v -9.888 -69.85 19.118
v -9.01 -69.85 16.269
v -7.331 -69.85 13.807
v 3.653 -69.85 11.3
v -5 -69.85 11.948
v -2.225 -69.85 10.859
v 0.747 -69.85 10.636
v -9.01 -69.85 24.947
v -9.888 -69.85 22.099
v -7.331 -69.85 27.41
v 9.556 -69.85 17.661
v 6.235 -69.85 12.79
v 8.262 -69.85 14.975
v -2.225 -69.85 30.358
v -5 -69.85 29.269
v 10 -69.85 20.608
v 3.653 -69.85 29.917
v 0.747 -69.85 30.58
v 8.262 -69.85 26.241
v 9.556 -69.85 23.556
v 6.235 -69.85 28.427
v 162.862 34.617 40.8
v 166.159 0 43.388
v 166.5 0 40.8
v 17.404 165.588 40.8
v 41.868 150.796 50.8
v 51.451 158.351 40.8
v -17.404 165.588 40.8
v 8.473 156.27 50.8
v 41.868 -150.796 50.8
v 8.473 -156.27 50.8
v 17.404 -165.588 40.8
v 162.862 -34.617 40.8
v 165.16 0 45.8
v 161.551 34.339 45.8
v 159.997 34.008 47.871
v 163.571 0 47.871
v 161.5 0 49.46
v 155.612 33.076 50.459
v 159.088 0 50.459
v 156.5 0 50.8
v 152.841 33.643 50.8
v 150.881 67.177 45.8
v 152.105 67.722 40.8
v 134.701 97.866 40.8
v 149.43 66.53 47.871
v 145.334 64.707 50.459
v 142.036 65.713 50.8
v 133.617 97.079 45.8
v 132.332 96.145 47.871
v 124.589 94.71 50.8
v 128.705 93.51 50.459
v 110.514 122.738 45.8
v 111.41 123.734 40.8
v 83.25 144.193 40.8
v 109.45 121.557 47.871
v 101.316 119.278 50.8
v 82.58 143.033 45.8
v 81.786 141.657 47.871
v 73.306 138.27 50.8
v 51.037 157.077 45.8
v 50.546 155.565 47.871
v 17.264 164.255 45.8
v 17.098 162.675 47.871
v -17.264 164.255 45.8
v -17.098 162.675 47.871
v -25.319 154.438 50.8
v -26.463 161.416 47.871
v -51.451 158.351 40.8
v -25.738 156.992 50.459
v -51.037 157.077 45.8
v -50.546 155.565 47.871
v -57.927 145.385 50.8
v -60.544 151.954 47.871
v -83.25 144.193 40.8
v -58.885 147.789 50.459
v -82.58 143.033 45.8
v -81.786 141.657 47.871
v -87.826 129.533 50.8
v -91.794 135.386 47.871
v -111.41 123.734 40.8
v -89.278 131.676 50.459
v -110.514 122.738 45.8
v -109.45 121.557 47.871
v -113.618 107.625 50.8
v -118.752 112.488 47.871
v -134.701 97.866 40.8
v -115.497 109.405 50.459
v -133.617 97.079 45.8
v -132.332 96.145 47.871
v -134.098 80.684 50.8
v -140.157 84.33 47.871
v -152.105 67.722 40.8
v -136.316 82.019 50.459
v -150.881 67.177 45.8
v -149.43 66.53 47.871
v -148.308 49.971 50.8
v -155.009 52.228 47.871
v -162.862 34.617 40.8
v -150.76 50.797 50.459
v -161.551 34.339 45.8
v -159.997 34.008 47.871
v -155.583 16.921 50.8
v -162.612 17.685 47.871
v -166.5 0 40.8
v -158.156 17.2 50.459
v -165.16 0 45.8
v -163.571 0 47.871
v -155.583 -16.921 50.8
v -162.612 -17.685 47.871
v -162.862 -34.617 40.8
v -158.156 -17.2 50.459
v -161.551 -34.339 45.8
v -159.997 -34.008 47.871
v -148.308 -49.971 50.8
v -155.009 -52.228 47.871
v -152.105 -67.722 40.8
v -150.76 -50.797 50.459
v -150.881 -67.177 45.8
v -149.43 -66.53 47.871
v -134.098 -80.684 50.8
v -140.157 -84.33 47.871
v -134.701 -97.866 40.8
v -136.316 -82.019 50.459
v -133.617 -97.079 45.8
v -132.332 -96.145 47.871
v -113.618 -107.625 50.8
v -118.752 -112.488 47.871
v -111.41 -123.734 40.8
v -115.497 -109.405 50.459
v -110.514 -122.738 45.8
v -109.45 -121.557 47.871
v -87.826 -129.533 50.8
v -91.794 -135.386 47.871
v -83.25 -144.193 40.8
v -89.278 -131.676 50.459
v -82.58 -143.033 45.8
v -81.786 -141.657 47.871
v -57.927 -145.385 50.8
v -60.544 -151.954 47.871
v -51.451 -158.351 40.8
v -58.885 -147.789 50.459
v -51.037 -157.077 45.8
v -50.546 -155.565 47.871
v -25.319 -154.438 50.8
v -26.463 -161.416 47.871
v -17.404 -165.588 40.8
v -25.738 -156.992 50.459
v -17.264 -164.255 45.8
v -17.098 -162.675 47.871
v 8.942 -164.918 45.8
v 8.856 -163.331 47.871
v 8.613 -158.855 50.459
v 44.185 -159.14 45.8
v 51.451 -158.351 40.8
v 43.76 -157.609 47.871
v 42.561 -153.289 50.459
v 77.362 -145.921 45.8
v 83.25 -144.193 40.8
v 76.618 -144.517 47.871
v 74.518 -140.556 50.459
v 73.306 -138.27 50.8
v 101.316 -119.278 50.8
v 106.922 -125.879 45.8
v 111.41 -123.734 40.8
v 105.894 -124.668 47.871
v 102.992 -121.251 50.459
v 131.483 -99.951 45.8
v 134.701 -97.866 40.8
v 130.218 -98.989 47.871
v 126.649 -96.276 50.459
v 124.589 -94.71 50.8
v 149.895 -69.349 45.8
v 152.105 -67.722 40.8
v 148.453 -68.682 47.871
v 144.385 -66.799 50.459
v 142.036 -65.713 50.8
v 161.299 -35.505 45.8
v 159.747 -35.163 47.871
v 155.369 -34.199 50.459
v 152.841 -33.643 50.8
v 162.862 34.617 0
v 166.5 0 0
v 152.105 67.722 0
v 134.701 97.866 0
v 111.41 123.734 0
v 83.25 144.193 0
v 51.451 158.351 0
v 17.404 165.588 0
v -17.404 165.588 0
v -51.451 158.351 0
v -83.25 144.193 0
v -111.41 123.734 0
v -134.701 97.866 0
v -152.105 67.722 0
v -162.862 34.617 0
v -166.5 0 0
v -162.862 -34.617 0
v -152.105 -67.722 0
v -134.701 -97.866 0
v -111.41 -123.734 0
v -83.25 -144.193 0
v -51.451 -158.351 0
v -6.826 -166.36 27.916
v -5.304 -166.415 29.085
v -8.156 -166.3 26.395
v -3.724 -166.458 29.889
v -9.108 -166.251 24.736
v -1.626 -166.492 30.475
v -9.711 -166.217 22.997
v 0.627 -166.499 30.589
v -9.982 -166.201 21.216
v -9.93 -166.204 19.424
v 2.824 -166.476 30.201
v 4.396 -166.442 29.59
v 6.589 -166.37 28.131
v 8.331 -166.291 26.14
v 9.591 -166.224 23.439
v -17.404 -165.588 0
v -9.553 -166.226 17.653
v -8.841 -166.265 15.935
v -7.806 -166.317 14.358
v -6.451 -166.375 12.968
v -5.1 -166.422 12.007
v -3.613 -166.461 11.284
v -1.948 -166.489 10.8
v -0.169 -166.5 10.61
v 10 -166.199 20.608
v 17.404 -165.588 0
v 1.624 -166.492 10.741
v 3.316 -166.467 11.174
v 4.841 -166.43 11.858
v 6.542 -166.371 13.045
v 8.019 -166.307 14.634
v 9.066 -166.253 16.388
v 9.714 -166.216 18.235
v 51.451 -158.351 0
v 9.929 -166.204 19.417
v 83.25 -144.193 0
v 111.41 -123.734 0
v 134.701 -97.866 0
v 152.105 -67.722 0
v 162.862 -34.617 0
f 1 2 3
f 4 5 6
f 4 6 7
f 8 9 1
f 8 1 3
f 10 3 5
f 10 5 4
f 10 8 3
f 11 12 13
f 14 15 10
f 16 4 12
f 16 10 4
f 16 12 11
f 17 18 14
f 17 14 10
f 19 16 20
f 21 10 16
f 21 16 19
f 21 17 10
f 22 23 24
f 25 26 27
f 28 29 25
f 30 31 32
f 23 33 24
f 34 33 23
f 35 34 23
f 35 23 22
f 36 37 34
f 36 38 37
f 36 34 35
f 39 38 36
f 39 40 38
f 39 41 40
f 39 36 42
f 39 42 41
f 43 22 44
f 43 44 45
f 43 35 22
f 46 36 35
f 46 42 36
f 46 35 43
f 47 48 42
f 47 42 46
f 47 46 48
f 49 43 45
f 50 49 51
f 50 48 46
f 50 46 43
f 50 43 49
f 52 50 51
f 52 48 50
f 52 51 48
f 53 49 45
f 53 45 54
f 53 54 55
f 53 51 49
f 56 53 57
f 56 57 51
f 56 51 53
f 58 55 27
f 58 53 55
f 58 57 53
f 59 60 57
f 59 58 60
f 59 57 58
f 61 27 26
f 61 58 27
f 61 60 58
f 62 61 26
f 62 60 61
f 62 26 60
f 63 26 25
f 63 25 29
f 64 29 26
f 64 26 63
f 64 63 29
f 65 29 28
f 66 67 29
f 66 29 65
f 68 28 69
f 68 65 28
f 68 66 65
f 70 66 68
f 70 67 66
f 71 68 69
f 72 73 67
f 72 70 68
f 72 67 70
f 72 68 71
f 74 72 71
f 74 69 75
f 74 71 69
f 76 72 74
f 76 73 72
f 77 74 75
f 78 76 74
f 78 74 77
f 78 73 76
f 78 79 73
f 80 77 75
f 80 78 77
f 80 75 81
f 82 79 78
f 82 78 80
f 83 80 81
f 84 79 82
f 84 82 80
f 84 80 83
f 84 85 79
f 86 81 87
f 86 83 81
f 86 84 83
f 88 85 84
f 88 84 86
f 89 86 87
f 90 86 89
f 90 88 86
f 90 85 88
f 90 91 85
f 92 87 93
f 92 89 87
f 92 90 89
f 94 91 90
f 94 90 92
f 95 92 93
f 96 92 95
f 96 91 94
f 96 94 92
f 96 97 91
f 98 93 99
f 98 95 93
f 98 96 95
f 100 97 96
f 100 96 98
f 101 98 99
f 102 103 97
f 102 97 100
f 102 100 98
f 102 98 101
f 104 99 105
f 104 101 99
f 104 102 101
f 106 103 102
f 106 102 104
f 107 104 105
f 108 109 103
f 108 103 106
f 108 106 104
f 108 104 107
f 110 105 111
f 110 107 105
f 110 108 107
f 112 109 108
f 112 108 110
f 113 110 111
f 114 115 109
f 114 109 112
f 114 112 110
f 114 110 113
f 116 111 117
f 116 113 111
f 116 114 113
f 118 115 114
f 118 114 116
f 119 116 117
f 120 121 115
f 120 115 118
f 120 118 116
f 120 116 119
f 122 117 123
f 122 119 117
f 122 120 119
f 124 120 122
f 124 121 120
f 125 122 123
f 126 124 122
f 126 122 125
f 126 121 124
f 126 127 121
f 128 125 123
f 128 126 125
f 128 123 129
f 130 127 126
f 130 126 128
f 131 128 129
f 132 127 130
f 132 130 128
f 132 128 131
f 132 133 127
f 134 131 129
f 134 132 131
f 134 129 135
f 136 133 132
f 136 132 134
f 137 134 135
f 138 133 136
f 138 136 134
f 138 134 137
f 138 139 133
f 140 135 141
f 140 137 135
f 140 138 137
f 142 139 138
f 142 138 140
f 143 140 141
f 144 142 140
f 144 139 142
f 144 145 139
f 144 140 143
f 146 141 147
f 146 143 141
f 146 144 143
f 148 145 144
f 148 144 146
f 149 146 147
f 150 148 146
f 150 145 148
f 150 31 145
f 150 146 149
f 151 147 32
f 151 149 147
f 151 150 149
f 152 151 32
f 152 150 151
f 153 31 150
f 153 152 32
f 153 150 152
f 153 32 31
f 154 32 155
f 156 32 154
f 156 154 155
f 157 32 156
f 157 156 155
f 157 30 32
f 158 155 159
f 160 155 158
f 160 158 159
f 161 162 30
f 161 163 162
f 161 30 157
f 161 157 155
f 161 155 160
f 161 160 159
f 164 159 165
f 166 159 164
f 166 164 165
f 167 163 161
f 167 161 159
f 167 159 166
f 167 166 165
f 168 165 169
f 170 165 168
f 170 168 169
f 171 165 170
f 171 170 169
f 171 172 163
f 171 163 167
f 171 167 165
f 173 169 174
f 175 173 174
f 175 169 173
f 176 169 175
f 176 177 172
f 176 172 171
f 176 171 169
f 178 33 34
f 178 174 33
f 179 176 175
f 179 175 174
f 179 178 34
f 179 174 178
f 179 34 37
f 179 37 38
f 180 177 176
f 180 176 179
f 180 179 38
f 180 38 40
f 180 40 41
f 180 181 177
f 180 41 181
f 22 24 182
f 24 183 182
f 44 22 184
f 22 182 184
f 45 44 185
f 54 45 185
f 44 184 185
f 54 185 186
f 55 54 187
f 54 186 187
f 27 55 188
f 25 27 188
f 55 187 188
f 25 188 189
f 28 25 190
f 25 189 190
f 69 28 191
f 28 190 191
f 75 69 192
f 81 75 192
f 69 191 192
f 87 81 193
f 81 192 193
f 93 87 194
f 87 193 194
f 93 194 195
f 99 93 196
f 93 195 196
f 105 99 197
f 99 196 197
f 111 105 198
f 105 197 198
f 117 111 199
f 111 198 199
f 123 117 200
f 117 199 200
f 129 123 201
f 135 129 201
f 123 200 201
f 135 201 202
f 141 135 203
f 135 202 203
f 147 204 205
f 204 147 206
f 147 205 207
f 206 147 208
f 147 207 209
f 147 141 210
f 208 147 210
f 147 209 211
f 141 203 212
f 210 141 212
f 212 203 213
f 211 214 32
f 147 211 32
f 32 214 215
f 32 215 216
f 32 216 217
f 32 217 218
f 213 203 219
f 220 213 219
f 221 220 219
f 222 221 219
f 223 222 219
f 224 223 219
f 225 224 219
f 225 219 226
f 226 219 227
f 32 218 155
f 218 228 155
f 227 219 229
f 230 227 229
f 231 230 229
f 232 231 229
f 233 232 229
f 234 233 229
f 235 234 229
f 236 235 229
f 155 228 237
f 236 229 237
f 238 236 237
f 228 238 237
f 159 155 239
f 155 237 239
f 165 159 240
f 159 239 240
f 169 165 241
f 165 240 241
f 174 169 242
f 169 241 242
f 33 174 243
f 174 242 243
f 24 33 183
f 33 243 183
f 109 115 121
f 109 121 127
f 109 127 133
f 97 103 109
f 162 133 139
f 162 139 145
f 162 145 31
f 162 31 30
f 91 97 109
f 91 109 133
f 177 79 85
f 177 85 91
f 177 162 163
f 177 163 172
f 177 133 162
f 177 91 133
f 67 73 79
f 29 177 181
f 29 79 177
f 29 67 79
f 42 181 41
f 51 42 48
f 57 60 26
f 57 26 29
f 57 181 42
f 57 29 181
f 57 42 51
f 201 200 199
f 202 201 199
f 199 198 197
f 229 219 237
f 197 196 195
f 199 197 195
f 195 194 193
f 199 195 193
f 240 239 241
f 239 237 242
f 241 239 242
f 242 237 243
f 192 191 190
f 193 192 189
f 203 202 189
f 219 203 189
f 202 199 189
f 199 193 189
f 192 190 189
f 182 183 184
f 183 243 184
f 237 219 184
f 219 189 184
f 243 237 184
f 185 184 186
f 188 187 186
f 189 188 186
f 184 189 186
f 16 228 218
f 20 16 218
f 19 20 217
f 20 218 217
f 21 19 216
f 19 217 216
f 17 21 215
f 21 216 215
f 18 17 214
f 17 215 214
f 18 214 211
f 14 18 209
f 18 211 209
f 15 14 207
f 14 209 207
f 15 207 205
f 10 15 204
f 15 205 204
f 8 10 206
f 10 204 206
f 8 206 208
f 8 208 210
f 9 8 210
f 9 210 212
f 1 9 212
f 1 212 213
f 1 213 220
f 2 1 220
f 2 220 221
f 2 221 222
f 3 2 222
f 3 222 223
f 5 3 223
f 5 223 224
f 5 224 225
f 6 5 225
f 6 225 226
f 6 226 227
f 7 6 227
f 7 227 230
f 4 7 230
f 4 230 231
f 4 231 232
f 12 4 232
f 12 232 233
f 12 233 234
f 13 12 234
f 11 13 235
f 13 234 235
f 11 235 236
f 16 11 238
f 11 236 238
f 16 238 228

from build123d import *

# Parameters (mm, degrees)
F0_R     = 166.5
F1_DEPTH = 50.8
F2_R     = 10
F4_R     = 10
F5_DEPTH = 97.282


with BuildPart() as f1:
    # F0 (on Top) → F1 (new body)
    with BuildSketch(Plane.XY):
        Circle(F0_R)
    extrude(amount=F1_DEPTH)

    # F2
    f2_edges = [f1.edges().sort_by_distance(p)[0] for p in [
        (-166.5, 0, 50.8),
    ]]
    fillet(f2_edges, radius=F2_R)

    # F4 (on offset) → F5 (cut)
    with BuildSketch(Plane.XZ.offset(167.132)):
        with Locations((0, 20.608293)):
            Circle(F4_R)
    extrude(amount=-F5_DEPTH, mode=Mode.SUBTRACT)


solid = f1.part
